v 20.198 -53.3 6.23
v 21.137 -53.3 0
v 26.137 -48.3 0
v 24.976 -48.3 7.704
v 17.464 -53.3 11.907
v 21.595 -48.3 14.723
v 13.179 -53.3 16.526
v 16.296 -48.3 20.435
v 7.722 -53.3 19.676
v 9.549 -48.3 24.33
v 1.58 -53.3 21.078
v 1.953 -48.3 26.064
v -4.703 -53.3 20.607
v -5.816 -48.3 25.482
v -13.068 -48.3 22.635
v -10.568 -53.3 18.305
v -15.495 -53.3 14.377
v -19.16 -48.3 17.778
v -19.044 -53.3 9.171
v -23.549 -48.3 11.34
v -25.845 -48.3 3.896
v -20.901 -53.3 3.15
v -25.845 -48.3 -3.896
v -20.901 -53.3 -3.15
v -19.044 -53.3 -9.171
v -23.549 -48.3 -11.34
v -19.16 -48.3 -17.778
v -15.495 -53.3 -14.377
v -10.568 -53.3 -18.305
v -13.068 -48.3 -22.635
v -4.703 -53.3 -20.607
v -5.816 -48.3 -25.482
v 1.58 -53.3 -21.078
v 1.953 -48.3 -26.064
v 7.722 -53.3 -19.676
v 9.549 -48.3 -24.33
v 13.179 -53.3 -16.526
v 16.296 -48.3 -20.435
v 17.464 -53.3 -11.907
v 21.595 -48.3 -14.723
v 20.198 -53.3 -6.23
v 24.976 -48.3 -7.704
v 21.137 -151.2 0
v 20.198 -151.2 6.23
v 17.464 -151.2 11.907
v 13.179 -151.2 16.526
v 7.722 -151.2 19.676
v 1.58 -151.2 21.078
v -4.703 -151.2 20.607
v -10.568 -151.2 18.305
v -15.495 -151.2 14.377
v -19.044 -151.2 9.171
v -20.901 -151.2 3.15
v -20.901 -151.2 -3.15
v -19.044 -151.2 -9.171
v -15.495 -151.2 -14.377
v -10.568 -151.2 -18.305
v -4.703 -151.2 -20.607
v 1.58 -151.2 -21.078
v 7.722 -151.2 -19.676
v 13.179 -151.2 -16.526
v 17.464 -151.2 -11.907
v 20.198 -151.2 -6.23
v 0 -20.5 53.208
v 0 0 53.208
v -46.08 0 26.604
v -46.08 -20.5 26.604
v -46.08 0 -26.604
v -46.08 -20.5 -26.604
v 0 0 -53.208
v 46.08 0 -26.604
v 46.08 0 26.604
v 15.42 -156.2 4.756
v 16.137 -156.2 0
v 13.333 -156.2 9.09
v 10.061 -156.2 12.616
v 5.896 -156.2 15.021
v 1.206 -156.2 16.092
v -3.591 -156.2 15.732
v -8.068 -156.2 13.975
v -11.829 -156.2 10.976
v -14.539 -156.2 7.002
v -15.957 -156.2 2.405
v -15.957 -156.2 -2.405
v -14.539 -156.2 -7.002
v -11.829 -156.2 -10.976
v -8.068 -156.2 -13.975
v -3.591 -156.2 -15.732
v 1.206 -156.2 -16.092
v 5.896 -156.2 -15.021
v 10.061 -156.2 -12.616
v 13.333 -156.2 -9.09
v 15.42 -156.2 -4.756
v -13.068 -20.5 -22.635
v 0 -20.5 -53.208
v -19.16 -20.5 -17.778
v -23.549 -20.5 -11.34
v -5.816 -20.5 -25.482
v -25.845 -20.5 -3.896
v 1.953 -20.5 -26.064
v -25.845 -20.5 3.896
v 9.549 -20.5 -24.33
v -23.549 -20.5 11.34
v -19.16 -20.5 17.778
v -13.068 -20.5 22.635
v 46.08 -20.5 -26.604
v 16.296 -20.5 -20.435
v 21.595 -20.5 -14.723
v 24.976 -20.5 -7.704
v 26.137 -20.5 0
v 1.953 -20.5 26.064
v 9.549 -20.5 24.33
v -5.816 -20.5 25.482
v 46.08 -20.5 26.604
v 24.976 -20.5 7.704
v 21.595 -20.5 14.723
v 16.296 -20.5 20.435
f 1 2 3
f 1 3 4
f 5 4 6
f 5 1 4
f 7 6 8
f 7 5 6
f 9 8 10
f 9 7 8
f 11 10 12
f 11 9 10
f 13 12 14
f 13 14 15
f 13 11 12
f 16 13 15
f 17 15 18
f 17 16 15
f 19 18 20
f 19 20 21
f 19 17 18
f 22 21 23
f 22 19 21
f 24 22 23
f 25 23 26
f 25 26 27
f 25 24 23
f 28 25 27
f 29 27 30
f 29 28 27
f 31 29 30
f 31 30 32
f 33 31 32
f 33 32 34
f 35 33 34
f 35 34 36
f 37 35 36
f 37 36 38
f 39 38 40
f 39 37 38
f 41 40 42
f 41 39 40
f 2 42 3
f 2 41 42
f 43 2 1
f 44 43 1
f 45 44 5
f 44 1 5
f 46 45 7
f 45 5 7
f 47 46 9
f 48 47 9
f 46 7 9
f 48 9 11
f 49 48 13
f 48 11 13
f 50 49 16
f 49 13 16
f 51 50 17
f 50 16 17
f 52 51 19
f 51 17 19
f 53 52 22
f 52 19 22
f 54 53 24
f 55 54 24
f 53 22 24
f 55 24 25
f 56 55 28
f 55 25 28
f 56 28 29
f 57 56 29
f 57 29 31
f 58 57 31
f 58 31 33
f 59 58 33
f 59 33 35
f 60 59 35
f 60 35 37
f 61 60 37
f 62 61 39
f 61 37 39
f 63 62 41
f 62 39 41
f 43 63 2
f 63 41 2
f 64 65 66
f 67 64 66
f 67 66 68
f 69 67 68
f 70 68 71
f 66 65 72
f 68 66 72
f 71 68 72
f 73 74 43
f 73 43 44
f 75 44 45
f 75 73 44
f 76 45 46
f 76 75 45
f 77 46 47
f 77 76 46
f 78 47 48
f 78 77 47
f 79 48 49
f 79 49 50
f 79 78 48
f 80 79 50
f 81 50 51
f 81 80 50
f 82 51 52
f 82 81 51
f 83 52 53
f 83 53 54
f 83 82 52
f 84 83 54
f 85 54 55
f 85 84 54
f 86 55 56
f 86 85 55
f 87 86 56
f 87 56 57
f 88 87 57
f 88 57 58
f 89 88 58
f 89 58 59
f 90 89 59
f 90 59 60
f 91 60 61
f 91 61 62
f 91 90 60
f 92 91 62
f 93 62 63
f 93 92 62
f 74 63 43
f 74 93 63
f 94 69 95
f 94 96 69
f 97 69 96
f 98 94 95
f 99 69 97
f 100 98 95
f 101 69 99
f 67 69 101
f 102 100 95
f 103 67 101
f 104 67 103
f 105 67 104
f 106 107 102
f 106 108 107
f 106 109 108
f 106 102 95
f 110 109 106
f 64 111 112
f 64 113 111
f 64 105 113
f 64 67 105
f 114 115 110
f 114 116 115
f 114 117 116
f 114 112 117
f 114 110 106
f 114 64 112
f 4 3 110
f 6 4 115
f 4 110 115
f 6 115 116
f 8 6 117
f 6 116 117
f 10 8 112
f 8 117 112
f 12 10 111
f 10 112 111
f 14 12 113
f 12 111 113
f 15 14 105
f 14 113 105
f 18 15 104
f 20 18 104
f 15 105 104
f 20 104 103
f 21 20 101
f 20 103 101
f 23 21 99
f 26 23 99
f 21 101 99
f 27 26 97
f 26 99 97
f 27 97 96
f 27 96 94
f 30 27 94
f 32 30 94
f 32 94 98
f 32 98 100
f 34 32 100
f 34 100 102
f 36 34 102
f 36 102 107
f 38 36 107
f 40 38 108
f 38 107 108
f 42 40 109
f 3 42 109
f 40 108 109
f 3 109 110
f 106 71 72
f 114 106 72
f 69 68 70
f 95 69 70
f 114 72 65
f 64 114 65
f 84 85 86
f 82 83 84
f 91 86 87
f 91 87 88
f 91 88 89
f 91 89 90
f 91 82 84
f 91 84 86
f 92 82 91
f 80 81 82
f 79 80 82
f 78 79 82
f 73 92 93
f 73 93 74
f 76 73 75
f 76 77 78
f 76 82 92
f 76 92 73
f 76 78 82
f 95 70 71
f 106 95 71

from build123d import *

# Parameters (mm, degrees)
F1_DEPTH = 20.5
F2_R     = 26.136981888
F3_DEPTH = 32.8
F4_SIZE  = 5
F5_DEPTH = 102.9
F6_SIZE  = 5


with BuildPart() as f1:
    # F0 (on Front) → F1 (new body)
    with BuildSketch(Plane.XZ):
        Polygon((46.0798591375, -26.6042190773), (46.0798591375, 26.6042190773), (0, 53.2084381546), (-46.0798591375, 26.6042190773), (-46.0798591375, -26.6042190773), (0, -53.2084381546), align=None)
    extrude(amount=F1_DEPTH)

    # F2 (on face) → F3 (join)
    with BuildSketch(Plane.XZ.offset(20.5)):
        Circle(F2_R)
    extrude(amount=F3_DEPTH)

    # F4
    f4_edges = [f1.edges().sort_by_distance(p)[0] for p in [
        (-26.136982, -53.3, 0),
    ]]
    chamfer(f4_edges, length=F4_SIZE)

    # F5 (add): a face of the model
    f5_faces = [f1.faces().sort_by_distance(p)[0] for p in [
        (0, -53.3, 0),
    ]]
    extrude(f5_faces, amount=F5_DEPTH)

    # F6
    f6_edges = [f1.edges().sort_by_distance(p)[0] for p in [
        (-21.136982, -156.2, 0),
    ]]
    chamfer(f6_edges, length=F6_SIZE)


solid = f1.part
